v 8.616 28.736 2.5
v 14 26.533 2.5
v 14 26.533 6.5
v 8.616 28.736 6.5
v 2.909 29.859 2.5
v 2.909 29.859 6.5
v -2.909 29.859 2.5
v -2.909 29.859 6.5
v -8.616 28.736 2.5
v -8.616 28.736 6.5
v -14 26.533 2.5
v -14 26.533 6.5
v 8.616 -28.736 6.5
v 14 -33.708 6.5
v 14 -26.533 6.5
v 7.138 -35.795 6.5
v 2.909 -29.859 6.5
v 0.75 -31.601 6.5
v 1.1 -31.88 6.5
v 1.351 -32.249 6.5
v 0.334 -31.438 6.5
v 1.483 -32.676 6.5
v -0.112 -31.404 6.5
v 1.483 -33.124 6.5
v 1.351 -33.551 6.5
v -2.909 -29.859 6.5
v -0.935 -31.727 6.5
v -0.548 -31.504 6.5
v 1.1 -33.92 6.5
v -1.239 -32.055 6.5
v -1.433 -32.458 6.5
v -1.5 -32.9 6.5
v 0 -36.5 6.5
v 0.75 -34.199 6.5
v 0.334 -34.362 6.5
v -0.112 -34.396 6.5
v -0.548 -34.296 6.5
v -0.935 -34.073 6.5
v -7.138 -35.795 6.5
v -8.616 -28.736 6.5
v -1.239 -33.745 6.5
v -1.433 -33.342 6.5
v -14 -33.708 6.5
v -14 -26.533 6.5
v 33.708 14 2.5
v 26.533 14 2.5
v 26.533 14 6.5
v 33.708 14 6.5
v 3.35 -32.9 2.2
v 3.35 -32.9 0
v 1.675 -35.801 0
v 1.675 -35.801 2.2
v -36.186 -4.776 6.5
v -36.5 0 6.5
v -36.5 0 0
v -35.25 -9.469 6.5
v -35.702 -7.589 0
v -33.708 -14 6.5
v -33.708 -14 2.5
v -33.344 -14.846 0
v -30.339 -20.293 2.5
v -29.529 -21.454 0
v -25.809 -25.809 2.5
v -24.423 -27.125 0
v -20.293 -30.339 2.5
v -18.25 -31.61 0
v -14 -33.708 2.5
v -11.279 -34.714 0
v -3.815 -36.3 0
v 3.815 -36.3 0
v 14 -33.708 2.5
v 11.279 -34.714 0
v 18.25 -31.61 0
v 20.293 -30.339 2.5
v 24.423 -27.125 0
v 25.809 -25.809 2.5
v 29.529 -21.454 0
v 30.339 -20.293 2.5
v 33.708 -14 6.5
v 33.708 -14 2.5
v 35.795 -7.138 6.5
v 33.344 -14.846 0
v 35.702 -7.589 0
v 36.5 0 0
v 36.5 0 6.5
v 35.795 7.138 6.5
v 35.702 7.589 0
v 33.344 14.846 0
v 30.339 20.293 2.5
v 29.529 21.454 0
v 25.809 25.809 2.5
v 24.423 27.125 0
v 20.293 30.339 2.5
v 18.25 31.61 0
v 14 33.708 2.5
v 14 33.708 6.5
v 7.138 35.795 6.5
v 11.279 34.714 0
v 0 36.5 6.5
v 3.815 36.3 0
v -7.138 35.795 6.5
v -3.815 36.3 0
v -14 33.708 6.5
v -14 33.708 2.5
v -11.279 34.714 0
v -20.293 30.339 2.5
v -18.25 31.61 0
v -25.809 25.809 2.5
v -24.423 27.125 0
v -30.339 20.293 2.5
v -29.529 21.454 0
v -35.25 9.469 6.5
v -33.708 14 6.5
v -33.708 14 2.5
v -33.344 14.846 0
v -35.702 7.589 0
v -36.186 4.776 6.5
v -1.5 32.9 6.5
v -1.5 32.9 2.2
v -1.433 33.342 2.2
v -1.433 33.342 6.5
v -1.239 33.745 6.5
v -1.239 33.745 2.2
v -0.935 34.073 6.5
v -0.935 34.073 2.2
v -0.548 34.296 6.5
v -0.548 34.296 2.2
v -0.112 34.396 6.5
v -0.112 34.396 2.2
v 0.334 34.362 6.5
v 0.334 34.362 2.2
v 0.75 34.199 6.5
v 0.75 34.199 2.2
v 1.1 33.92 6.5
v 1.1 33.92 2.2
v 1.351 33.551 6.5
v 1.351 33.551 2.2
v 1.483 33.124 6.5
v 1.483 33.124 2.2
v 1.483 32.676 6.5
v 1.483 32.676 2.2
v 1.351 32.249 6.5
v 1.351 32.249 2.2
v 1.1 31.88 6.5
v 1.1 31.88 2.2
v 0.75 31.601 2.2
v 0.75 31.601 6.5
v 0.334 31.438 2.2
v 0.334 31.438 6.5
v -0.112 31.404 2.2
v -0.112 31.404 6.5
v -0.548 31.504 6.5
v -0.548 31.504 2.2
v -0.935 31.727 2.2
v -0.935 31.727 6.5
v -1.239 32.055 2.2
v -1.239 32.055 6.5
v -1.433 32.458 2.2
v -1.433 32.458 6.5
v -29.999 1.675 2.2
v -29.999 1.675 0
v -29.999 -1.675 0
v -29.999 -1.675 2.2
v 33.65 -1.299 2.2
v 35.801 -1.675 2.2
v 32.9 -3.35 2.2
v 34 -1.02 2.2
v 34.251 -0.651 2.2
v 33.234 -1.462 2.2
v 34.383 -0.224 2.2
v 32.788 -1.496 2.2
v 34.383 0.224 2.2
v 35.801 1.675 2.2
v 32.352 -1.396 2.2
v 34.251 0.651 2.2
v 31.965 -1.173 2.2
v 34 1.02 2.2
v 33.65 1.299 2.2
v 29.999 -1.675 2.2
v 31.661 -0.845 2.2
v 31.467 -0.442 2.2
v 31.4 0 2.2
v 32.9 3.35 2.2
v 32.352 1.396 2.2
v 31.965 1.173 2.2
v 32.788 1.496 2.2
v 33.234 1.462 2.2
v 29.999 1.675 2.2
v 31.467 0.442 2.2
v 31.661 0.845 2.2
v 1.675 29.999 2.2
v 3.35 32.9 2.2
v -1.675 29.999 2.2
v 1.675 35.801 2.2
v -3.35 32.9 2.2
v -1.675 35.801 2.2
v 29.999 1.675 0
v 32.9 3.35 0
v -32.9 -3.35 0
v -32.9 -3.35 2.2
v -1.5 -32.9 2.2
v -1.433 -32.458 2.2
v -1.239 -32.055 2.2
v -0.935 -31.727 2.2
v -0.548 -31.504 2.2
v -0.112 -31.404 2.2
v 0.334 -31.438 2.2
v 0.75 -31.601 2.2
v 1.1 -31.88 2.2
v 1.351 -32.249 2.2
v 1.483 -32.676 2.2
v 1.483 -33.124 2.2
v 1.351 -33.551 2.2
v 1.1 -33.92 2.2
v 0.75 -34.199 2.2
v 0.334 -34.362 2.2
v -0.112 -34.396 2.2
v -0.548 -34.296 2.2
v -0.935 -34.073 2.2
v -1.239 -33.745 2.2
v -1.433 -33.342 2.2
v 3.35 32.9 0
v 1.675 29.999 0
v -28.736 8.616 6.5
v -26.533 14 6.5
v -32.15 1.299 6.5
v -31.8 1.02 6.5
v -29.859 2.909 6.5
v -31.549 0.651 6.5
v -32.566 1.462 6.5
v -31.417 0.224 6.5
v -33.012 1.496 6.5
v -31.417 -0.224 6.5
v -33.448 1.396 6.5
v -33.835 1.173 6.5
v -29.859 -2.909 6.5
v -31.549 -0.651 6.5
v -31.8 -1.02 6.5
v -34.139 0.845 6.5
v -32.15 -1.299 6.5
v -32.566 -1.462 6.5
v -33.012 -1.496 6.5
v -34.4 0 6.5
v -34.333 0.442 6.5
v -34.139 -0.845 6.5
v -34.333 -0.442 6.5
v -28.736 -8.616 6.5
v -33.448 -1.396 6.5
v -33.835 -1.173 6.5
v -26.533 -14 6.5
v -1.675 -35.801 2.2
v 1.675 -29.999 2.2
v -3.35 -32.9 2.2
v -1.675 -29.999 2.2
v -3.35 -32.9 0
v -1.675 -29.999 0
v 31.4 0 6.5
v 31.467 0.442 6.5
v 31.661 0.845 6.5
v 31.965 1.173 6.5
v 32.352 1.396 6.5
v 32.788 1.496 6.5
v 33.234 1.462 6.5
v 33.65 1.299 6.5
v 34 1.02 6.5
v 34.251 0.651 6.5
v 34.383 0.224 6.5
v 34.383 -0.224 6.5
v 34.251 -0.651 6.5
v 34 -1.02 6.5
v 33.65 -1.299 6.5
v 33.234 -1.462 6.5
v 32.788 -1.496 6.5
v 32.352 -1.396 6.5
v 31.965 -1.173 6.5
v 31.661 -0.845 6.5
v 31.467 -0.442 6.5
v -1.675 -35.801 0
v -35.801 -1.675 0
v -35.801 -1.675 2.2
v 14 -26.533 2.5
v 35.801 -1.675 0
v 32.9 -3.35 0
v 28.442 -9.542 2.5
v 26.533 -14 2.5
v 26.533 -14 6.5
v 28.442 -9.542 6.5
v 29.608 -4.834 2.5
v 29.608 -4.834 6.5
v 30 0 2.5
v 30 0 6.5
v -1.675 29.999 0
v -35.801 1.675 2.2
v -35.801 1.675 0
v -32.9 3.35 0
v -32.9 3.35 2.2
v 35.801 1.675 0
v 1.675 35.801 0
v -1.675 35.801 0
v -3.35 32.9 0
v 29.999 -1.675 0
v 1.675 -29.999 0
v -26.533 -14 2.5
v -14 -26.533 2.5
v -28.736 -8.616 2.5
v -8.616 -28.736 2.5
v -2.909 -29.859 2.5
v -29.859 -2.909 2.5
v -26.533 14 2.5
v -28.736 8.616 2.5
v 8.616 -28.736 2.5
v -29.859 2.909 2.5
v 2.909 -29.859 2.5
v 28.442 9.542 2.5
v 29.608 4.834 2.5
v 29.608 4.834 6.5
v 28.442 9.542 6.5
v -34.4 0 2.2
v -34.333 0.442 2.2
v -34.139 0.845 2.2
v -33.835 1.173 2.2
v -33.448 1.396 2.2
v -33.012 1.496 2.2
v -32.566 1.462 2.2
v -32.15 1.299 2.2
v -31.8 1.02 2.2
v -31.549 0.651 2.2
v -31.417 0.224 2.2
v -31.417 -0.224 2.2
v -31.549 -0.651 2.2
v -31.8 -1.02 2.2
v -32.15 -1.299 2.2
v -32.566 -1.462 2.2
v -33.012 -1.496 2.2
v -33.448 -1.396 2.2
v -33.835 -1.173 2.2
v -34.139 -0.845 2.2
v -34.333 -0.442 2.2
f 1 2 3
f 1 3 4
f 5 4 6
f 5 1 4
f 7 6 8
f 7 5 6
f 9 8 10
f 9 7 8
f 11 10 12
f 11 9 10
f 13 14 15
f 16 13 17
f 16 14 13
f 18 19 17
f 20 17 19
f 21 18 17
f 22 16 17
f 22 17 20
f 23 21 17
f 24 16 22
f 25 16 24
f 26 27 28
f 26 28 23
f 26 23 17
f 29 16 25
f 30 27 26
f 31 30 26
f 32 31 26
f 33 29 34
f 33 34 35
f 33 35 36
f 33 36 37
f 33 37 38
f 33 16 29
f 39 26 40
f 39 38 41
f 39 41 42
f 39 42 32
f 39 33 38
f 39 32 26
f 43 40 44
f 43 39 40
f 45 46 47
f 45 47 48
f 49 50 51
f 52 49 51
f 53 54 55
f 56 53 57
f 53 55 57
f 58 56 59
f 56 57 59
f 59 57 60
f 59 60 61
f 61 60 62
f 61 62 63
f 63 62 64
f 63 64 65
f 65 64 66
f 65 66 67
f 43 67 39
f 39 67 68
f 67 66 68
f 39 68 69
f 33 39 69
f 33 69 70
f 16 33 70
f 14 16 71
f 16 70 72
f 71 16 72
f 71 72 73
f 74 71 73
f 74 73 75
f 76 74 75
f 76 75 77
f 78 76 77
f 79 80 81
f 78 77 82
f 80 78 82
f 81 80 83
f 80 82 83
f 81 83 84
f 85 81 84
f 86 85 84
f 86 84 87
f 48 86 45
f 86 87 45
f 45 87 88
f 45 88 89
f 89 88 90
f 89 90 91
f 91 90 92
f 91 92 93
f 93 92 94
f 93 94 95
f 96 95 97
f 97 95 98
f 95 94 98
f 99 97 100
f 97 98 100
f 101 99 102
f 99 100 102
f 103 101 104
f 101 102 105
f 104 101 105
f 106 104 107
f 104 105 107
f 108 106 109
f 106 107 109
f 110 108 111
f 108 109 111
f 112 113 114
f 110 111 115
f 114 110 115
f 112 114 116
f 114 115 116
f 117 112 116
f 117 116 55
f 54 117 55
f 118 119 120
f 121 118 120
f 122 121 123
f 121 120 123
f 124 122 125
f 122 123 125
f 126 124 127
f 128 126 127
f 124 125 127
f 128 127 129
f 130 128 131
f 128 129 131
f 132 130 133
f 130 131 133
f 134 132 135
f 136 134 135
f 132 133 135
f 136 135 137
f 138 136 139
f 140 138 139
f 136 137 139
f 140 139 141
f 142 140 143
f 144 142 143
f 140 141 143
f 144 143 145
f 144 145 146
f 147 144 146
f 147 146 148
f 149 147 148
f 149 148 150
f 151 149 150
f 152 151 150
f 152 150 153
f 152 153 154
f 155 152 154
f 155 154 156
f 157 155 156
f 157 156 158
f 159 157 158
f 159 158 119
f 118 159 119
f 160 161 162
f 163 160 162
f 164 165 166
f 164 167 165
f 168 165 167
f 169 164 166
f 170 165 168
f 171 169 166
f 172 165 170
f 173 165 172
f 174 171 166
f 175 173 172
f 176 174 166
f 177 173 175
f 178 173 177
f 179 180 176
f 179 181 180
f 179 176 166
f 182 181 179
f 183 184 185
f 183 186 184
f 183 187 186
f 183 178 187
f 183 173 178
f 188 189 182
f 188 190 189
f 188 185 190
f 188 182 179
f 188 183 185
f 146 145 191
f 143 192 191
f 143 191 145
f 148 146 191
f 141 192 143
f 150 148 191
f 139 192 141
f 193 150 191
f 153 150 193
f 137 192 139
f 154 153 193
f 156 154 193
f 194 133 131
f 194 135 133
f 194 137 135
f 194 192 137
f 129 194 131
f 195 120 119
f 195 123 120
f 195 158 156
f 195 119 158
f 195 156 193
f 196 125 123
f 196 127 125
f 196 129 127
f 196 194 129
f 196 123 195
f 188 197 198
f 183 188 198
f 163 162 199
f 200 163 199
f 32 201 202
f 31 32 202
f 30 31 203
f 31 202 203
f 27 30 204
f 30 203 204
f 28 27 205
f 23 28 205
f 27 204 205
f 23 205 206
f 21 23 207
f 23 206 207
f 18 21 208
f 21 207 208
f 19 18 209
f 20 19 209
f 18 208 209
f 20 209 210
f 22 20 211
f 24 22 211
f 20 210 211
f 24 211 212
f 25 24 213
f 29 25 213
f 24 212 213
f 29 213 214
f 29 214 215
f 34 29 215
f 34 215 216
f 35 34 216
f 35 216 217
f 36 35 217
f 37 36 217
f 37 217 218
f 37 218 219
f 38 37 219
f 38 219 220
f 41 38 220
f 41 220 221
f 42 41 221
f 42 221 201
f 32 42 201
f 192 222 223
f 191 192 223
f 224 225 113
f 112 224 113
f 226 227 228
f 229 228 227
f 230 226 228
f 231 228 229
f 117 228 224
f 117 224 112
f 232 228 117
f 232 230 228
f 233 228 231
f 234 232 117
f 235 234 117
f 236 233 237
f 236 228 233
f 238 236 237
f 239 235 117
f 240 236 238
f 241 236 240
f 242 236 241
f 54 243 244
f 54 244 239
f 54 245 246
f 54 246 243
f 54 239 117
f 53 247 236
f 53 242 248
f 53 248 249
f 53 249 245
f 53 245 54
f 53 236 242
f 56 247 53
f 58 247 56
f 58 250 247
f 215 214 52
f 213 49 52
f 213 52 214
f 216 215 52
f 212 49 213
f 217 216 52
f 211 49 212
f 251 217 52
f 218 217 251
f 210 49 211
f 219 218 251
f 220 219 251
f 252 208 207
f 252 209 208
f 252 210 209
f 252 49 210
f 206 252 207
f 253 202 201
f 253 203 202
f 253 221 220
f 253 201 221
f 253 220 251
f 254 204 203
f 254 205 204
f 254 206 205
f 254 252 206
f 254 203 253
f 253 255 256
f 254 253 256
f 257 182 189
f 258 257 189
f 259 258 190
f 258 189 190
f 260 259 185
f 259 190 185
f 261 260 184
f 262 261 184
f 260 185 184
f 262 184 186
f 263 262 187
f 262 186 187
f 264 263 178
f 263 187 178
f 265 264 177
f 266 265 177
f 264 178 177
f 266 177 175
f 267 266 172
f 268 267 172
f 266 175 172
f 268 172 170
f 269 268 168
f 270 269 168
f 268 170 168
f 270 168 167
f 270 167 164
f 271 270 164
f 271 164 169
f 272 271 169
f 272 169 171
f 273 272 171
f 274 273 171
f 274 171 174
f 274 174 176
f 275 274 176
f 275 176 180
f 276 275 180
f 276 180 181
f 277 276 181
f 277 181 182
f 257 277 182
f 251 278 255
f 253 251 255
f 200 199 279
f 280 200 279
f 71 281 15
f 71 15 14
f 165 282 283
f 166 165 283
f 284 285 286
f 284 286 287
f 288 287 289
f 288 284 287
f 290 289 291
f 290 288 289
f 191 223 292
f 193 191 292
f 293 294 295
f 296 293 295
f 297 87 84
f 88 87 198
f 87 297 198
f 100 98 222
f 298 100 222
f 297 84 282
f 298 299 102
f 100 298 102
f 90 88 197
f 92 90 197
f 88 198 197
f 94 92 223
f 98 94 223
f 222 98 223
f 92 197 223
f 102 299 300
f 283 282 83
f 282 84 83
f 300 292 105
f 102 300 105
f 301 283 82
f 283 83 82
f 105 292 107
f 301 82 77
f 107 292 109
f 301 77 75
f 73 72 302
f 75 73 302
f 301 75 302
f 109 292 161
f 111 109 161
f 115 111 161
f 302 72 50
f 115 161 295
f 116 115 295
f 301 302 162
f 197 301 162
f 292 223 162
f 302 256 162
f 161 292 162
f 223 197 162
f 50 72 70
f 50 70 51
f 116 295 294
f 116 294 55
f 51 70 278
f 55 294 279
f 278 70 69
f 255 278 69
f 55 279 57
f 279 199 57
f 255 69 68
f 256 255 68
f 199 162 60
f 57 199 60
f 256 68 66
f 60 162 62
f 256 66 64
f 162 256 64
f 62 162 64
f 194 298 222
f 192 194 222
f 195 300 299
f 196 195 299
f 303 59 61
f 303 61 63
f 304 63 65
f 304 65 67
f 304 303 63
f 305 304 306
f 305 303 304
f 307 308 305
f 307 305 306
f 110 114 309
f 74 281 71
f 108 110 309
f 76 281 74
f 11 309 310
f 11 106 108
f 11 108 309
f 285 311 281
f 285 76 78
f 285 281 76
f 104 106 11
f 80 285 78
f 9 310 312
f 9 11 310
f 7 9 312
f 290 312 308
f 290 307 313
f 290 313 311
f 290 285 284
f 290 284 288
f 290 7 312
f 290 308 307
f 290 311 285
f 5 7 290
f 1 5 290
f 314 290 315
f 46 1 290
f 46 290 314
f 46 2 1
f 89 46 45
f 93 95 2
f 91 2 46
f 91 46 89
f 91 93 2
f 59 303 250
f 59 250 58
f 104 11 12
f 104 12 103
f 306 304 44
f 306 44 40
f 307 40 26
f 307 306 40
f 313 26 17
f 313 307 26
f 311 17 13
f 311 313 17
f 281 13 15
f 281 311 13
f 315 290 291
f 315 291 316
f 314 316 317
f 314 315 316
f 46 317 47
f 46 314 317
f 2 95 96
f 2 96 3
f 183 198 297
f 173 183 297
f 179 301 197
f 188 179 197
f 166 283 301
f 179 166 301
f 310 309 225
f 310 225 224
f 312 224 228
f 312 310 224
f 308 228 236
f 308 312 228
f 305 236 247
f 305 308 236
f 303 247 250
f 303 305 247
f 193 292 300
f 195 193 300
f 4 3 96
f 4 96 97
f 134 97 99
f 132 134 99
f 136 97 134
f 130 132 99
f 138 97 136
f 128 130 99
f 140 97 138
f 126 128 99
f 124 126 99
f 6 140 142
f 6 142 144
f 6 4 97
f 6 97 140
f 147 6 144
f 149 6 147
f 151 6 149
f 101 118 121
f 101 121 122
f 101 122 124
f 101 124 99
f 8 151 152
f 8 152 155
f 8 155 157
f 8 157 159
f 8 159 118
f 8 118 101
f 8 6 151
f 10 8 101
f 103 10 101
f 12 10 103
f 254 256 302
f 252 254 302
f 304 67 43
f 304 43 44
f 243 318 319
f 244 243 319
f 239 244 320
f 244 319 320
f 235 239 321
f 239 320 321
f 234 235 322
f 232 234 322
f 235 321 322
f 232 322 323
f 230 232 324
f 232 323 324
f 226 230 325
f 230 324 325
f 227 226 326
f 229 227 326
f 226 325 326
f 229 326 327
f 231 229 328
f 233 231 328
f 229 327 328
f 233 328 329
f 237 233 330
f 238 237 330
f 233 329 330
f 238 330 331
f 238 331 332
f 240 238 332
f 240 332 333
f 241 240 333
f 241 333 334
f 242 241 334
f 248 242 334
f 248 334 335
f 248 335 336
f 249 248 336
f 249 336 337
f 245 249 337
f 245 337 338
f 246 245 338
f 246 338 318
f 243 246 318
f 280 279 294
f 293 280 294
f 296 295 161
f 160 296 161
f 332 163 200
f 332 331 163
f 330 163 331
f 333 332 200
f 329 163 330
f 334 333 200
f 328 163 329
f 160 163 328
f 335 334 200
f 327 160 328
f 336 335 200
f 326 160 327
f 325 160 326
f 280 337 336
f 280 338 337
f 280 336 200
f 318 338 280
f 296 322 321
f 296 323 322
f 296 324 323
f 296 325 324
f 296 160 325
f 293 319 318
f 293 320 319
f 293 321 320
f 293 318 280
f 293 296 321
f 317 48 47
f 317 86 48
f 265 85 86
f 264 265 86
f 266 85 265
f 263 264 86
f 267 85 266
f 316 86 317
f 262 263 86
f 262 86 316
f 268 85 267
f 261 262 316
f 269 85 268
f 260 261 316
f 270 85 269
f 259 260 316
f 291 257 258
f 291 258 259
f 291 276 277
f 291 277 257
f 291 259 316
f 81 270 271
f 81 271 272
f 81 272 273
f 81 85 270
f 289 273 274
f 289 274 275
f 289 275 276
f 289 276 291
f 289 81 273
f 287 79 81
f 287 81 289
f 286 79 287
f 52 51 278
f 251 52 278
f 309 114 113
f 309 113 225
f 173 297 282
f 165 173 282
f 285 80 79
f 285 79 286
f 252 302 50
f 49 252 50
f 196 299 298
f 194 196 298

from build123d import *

# Parameters (mm, degrees)
SKETCH_1_R          = 36.5
EXTRUDE_1_DEPTH     = 6.5
CUT_EXTRUDE_START   = -4
CUT_EXTRUDE_2_DEPTH = 4
CUT_EXTRUDE_3_DEPTH = 4
SKETCH_6_R          = 1.5
CUT_EXTRUDE_5_DEPTH = 53.026435588
CUT_EXTRUDE_6_DEPTH = 2.2


with BuildPart() as part:
    # 草图1 → 凸台-拉伸1 (new body)
    with BuildSketch(Plane.XY):
        with Locations(Location((0, 0, 0), (0, 0, 180))):
            Circle(SKETCH_1_R)
    extrude(amount=EXTRUDE_1_DEPTH)

    # 草图3 → 切除-拉伸2 (cut)
    with BuildSketch(Plane.XY.offset(6.5).offset(CUT_EXTRUDE_START)):
        with BuildLine():
            Line((14, 33.708307581), (14, 26.532998323))
            ThreePointArc((14, 26.532998323), (21.213203436, 21.213203436), (26.532998323, 14))
            Line((26.532998323, 14), (33.708307581, 14))
            ThreePointArc((33.708307581, 14), (25.809397513, 25.809397513), (14, 33.708307581))
        make_face()
        with BuildLine():
            ThreePointArc((26.532998323, -14), (21.213203436, -21.213203436), (14, -26.532998323))
            Line((14, -26.532998323), (14, -33.708307581))
            ThreePointArc((14, -33.708307581), (25.809397513, -25.809397513), (33.708307581, -14))
            Line((33.708307581, -14), (26.532998323, -14))
        make_face()
        with BuildLine():
            Line((-14, -33.708307581), (-14, -26.532998323))
            ThreePointArc((-14, -26.532998323), (-21.213203436, -21.213203436), (-26.532998323, -14))
            Line((-26.532998323, -14), (-33.708307581, -14))
            ThreePointArc((-33.708307581, -14), (-25.809397513, -25.809397513), (-14, -33.708307581))
        make_face()
        with BuildLine():
            Line((-33.708307581, 14), (-26.532998323, 14))
            ThreePointArc((-26.532998323, 14), (-21.213203436, 21.213203436), (-14, 26.532998323))
            Line((-14, 26.532998323), (-14, 33.708307581))
            ThreePointArc((-14, 33.708307581), (-25.809397513, 25.809397513), (-33.708307581, 14))
        make_face()
    extrude(amount=CUT_EXTRUDE_2_DEPTH, mode=Mode.SUBTRACT)

    # 草图4 → 切除-拉伸3 (cut)
    with BuildSketch(Plane.XY.offset(6.5).offset(CUT_EXTRUDE_START)):
        with BuildLine():
            ThreePointArc((26.532998323, -14), (29.120353275, -7.211450974), (30, 0))
            ThreePointArc((30, 0), (29.120353275, 7.211450974), (26.532998323, 14))
            ThreePointArc((26.532998323, 14), (21.213203436, 21.213203436), (14, 26.532998323))
            ThreePointArc((14, 26.532998323), (0, 30), (-14, 26.532998323))
            ThreePointArc((-14, 26.532998323), (-21.213203436, 21.213203436), (-26.532998323, 14))
            ThreePointArc((-26.532998323, 14), (-30, 0), (-26.532998323, -14))
            ThreePointArc((-26.532998323, -14), (-21.213203436, -21.213203436), (-14, -26.532998323))
            ThreePointArc((-14, -26.532998323), (0, -30), (14, -26.532998323))
            ThreePointArc((14, -26.532998323), (21.213203436, -21.213203436), (26.532998323, -14))
        make_face()
    extrude(amount=CUT_EXTRUDE_3_DEPTH, mode=Mode.SUBTRACT)

    # 草图6 → 切除-拉伸5 (cut, through all)
    with BuildSketch(Plane(origin=(0, 0, 0), x_dir=(-1, 0, 0), z_dir=(0, 0, -1))):
        with Locations((32.9, 0)):
            Circle(SKETCH_6_R)
        with Locations((0, -32.9)):
            Circle(SKETCH_6_R)
        with Locations((0, 32.9)):
            Circle(SKETCH_6_R)
        with Locations((-32.9, 0)):
            Circle(SKETCH_6_R)
    extrude(amount=-CUT_EXTRUDE_5_DEPTH, mode=Mode.SUBTRACT)

    # 草图8 → 切除-拉伸6 (cut)
    with BuildSketch(Plane(origin=(0, 0, 0), x_dir=(-1, 0, 0), z_dir=(0, 0, -1))):
        Polygon((-29.998814897, -1.675), (-29.998814897, 1.675), (-32.9, 3.35), (-35.801185103, 1.675), (-35.801185103, -1.675), (-32.9, -3.35), align=None)
        Polygon((1.675, -35.801185103), (3.35, -32.9), (1.675, -29.998814897), (-1.675, -29.998814897), (-3.35, -32.9), (-1.675, -35.801185103), align=None)
        Polygon((35.801185103, -1.675), (35.801185103, 1.675), (32.9, 3.35), (29.998814897, 1.675), (29.998814897, -1.675), (32.9, -3.35), align=None)
        Polygon((1.675, 29.998814897), (3.35, 32.9), (1.675, 35.801185103), (-1.675, 35.801185103), (-3.35, 32.9), (-1.675, 29.998814897), align=None)
    extrude(amount=-CUT_EXTRUDE_6_DEPTH, mode=Mode.SUBTRACT)


solid = part.part
